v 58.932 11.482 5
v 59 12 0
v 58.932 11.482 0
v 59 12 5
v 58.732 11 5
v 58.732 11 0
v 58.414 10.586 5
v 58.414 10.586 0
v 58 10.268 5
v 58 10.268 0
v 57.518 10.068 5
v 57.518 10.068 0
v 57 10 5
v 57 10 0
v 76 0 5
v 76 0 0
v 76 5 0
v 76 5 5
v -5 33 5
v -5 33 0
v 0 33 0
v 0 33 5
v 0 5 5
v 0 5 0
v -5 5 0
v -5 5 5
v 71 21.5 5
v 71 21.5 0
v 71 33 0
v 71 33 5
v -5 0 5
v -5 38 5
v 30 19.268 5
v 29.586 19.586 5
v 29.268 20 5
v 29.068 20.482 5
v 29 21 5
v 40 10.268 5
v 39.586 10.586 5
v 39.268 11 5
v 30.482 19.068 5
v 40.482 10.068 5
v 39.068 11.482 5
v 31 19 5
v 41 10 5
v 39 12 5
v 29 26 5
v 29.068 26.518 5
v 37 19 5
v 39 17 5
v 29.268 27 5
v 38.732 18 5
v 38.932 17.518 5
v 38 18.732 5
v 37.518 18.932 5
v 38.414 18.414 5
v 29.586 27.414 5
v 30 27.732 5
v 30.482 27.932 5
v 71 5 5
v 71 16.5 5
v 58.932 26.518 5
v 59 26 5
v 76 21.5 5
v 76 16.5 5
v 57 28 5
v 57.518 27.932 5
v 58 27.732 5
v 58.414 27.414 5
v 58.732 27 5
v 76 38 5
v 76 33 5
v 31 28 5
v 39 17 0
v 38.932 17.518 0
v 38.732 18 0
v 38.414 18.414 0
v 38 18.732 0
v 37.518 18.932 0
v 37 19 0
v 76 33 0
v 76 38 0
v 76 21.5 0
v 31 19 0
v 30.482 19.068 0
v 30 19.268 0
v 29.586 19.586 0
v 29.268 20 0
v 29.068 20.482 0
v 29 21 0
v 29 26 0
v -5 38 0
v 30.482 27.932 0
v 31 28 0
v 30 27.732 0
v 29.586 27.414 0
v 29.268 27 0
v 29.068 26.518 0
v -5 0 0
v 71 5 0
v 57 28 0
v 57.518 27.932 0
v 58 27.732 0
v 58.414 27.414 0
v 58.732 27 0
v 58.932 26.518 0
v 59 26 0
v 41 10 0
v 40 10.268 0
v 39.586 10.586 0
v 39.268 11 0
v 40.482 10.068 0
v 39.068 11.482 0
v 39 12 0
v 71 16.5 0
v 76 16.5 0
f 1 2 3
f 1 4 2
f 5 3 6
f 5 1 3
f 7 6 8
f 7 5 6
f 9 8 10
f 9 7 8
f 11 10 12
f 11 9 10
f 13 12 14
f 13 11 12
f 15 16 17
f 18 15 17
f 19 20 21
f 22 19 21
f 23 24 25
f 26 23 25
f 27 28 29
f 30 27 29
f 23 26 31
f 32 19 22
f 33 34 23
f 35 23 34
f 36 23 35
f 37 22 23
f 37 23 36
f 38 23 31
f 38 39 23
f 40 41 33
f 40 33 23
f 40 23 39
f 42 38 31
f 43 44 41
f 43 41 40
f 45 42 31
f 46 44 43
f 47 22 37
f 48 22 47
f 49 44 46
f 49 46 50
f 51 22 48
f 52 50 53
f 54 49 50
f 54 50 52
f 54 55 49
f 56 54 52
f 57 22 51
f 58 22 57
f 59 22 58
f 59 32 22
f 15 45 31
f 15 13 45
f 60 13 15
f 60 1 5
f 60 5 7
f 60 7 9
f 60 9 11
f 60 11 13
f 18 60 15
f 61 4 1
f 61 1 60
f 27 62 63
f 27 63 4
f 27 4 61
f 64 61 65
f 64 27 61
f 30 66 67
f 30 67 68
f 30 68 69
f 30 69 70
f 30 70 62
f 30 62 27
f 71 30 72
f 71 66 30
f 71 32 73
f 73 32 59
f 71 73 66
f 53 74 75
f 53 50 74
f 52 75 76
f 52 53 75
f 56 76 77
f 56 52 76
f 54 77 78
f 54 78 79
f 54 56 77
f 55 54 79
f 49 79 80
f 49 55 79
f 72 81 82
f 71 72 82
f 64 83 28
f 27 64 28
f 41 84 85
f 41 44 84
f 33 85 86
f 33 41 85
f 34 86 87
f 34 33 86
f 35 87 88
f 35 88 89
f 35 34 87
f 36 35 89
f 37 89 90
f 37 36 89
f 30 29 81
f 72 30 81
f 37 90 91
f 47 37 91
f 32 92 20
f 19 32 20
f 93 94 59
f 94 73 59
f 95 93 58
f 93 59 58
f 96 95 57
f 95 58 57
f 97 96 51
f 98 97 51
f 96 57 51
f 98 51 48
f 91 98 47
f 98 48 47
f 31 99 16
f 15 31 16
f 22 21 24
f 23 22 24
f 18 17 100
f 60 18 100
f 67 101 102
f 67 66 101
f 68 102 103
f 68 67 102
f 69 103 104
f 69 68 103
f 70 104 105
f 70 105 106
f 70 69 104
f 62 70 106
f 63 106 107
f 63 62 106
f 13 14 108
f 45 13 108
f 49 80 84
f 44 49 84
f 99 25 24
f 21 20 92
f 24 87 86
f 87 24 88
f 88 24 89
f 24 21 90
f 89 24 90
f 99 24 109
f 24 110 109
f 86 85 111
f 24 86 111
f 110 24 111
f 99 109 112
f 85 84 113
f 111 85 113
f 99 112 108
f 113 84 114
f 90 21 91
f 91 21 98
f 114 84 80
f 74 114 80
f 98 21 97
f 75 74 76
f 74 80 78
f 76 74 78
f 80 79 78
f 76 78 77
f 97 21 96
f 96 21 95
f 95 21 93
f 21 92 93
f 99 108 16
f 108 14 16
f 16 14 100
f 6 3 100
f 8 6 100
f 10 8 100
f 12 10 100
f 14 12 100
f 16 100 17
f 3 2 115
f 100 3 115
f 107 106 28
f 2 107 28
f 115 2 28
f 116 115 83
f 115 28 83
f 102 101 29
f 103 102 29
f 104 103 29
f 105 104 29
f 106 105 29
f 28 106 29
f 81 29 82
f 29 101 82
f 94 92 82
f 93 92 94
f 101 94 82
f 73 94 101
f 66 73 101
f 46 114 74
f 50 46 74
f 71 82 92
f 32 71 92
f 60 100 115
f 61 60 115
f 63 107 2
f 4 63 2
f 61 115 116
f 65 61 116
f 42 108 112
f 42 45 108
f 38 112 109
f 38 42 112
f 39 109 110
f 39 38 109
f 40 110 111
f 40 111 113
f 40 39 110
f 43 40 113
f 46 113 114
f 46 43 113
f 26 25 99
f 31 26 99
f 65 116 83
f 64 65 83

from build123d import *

# Parameters (mm, degrees)
BOSS_EXTRU_1_DEPTH = 5
CONG_1_R           = 2


with BuildPart() as part:
    # Esquisse1 → Boss.-Extru.1 (new body)
    with BuildSketch(Plane.XY):
        Polygon((0, 0), (71, 0), (76, 0), (76, 5), (71, 5), (71, 16.5), (76, 16.5), (76, 21.5), (71, 21.5), (71, 33), (76, 33), (76, 38), (71, 38), (0, 38), (-5, 38), (-5, 33), (0, 33), (0, 5), (-5, 5), (-5, 0), align=None)
        Polygon((39, 28), (59, 28), (59, 10), (39, 10), (39, 19), (29, 19), (29, 28), align=None, mode=Mode.SUBTRACT)
    extrude(amount=BOSS_EXTRU_1_DEPTH)

    # Congé1
    cong_1_edges = [part.edges().sort_by_distance(p)[0] for p in [
        (29, 28, 2.5),
        (29, 19, 2.5),
        (39, 19, 2.5),
        (39, 10, 2.5),
        (59, 10, 2.5),
        (59, 28, 2.5),
    ]]
    fillet(cong_1_edges, radius=CONG_1_R)


solid = part.part
